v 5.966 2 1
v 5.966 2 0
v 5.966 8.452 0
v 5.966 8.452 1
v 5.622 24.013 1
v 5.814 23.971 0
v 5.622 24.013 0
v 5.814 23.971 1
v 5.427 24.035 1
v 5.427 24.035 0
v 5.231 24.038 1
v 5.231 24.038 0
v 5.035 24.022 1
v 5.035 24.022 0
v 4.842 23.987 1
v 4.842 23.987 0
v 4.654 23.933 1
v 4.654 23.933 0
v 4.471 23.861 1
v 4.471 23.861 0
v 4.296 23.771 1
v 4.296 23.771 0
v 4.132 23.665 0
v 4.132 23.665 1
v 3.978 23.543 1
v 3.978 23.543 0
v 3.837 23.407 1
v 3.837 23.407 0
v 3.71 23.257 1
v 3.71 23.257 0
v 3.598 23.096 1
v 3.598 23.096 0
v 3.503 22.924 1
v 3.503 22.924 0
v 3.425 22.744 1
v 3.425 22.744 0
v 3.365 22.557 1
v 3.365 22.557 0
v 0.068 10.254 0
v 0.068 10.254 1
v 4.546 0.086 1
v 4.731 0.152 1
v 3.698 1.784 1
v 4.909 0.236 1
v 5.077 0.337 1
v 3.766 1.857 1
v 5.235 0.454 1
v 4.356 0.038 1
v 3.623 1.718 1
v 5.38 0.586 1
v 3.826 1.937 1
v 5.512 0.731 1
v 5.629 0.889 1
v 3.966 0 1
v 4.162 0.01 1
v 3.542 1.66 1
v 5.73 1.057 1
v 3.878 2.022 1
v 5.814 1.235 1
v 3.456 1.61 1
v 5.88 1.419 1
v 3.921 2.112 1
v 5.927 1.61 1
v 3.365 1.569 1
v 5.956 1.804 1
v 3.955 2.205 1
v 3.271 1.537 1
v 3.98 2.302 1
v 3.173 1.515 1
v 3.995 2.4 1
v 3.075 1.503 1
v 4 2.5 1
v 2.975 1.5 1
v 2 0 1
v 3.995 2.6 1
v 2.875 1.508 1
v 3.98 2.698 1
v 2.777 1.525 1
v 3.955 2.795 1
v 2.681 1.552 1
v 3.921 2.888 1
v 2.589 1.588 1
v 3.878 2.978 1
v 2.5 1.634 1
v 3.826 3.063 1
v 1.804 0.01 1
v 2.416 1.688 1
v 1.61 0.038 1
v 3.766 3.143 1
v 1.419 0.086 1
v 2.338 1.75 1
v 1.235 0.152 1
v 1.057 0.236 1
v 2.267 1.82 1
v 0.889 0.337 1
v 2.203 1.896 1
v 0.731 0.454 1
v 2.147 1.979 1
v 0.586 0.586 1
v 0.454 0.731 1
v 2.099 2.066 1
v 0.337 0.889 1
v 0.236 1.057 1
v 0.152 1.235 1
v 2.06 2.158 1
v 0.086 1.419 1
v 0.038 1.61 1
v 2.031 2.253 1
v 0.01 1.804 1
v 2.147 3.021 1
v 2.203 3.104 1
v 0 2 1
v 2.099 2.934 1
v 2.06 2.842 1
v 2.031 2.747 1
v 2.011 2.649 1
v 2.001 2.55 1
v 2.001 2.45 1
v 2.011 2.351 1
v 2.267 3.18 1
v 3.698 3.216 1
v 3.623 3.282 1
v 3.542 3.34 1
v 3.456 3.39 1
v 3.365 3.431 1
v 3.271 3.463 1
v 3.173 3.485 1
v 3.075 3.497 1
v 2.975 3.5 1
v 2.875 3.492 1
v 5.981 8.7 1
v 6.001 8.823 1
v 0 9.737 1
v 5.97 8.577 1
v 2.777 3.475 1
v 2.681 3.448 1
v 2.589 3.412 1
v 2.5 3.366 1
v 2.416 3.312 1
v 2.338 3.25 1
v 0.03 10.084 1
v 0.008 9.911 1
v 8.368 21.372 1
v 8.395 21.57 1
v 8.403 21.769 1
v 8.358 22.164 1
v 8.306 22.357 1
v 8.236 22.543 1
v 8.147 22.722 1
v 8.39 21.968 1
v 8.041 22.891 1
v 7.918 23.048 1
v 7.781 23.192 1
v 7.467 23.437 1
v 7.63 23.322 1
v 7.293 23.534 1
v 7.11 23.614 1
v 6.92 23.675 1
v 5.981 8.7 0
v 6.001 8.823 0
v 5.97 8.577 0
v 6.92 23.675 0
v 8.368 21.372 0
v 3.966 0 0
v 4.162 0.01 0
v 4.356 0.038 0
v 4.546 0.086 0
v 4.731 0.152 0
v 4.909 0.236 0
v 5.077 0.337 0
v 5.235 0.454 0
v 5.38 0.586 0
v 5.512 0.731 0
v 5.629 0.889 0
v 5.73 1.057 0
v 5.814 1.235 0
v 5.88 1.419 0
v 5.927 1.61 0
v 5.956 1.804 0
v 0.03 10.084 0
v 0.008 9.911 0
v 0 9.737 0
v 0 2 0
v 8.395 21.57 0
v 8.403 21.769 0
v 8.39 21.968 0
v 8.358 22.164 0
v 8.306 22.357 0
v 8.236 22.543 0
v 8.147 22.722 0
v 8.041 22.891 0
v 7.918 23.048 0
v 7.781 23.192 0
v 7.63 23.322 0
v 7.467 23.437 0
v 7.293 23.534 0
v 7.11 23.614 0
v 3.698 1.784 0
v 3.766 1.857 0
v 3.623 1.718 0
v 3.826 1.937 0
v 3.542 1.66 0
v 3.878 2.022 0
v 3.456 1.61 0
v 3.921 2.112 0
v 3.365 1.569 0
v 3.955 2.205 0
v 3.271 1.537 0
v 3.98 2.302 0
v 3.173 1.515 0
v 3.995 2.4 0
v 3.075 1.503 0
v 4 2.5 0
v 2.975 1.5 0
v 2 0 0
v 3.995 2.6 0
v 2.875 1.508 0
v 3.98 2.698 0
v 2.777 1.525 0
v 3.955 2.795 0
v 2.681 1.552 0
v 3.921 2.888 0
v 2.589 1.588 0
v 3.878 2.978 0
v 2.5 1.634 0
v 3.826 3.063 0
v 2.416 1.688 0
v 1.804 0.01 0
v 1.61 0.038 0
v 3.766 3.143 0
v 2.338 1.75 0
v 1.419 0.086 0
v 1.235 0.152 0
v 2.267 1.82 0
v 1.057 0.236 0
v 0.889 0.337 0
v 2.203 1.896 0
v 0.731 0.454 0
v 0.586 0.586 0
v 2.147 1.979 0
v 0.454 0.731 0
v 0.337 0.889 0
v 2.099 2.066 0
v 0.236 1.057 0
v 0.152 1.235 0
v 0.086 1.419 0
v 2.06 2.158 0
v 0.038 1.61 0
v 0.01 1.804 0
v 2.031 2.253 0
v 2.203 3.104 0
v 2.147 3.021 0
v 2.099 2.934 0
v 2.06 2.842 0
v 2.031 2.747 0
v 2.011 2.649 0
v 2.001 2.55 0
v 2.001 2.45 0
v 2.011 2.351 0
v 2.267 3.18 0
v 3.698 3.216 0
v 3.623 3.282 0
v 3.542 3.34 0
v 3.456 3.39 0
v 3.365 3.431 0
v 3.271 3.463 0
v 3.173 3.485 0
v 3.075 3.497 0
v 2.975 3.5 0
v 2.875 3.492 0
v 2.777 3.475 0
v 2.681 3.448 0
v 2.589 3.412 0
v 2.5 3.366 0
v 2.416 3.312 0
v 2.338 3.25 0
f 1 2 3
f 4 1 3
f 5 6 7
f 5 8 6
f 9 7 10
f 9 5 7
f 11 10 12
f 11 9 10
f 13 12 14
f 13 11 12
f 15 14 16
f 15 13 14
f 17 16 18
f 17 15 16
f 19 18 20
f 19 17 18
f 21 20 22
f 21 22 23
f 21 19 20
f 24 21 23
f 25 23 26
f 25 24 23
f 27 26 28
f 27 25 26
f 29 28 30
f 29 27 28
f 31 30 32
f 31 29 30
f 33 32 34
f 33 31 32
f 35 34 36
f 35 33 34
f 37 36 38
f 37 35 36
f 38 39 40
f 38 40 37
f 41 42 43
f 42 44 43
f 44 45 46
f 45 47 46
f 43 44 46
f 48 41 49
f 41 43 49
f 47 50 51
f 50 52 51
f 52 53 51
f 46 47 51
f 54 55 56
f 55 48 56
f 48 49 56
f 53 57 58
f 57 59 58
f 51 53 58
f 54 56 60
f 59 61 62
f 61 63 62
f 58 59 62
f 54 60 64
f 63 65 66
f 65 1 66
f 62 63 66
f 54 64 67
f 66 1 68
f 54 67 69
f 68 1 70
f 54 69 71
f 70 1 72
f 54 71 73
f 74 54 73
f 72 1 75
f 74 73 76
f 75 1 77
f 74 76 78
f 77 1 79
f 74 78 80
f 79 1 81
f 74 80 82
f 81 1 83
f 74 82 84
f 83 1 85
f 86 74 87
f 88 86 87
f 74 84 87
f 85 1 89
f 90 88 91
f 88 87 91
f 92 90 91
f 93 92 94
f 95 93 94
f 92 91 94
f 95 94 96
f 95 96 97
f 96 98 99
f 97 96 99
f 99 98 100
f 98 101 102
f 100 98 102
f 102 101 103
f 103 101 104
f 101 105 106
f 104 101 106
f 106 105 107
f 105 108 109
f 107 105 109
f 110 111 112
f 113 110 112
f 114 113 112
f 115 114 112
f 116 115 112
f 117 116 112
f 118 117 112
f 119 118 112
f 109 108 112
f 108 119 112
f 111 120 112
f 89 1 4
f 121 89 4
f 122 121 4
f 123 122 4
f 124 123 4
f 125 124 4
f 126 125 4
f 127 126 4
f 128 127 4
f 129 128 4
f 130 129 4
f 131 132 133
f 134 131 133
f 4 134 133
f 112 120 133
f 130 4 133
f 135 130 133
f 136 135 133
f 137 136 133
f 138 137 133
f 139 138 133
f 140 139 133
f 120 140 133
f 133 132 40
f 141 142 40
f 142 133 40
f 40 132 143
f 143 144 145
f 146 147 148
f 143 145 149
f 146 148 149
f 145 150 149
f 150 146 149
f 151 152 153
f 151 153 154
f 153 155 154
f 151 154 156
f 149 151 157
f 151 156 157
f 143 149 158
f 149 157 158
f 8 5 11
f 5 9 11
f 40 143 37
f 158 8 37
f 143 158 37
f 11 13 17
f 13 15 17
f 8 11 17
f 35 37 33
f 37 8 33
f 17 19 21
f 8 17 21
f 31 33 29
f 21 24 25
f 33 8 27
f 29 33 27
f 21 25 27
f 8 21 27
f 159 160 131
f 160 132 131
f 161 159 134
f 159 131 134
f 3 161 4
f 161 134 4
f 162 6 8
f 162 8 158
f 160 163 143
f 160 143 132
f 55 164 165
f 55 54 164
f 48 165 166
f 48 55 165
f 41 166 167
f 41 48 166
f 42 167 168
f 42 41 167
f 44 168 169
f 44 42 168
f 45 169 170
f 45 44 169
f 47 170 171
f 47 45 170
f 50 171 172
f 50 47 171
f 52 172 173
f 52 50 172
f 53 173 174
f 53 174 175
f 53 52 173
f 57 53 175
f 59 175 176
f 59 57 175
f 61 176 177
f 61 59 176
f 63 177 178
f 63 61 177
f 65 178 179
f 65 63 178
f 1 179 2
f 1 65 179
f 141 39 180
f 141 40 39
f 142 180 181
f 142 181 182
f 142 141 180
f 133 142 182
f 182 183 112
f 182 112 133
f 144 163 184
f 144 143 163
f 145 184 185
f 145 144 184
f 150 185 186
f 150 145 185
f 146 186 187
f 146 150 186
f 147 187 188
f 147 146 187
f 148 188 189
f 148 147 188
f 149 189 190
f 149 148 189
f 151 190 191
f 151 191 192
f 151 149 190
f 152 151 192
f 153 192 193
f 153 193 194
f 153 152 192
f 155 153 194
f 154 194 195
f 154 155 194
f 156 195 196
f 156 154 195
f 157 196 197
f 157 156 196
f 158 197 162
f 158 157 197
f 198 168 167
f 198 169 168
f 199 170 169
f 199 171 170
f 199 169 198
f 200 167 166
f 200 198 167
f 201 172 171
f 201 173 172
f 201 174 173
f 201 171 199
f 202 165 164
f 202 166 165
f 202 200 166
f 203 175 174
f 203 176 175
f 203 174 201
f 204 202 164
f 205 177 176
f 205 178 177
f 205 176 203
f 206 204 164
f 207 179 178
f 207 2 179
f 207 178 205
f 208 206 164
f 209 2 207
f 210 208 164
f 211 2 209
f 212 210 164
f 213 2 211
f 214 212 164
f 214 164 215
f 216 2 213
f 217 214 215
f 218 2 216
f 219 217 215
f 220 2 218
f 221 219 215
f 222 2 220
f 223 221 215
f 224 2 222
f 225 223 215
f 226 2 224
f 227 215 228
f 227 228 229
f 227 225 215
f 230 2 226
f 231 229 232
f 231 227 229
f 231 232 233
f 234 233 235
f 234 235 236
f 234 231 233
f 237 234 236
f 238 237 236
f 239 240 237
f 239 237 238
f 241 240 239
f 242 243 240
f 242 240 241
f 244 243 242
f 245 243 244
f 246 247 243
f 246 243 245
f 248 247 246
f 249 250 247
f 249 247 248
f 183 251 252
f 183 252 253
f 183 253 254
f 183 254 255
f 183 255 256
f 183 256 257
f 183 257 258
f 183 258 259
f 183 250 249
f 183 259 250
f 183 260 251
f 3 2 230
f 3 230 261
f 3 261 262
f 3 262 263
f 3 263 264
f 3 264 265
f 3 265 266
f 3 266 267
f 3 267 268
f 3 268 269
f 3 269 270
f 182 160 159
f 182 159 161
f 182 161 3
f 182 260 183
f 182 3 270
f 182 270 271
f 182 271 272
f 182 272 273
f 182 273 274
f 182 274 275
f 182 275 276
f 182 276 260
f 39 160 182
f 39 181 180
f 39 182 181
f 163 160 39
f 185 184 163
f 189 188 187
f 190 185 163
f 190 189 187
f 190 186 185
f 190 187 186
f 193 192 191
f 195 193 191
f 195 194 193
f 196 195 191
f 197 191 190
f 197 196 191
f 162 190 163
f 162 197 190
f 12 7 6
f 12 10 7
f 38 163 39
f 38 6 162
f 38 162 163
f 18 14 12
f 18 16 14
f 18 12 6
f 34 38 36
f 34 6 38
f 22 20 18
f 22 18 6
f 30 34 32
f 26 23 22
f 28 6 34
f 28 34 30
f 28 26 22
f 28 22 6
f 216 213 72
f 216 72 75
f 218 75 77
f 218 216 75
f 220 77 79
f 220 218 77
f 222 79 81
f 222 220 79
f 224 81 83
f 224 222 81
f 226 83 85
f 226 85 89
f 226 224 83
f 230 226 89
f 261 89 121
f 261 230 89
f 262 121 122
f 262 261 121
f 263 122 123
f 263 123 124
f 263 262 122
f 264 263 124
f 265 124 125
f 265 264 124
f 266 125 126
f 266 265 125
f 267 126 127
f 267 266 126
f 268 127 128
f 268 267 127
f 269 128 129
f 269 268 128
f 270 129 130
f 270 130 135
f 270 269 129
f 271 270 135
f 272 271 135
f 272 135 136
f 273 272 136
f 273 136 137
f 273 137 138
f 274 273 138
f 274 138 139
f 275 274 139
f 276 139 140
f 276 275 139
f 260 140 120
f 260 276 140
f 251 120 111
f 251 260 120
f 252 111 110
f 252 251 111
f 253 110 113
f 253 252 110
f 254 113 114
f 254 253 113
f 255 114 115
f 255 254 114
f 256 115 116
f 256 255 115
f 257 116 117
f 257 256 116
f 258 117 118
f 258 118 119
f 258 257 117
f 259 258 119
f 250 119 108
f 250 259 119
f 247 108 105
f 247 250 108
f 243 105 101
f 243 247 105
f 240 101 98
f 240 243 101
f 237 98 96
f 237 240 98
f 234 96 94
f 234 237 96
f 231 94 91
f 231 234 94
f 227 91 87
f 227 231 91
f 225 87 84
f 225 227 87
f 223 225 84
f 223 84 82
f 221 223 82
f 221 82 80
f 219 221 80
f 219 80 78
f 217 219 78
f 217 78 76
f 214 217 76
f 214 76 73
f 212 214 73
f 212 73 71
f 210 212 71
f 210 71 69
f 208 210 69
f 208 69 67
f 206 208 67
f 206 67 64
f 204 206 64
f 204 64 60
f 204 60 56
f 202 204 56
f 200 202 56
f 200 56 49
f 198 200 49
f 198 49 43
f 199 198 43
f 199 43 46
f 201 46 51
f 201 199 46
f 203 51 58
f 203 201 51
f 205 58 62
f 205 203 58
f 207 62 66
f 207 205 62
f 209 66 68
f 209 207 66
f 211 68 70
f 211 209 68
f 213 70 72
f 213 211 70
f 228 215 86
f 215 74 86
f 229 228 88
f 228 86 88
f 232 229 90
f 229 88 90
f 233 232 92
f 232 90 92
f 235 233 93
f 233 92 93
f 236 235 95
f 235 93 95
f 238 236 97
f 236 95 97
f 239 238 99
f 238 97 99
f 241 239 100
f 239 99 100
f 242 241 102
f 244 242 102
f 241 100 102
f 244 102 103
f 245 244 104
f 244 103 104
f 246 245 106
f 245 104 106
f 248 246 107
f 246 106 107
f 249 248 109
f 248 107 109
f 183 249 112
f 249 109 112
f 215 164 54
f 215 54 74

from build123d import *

# Parameters (mm, degrees)
SKETCH1_R           = 1
BOSS_EXTRUDE1_DEPTH = 1
FILLET1_R           = 2
FILLET2_R           = 2
FILLET3_R           = 2
FILLET4_R           = 2
FILLET5_R           = 2
FILLET6_R           = 2


with BuildPart() as part:
    # Sketch1 → Boss-Extrude1 (new body)
    with BuildSketch(Plane.XY):
        Polygon((0, 10), (3.882285677, 24.488887394), (8.711914808, 23.194792169), (5.965925826, 8.639463055), (5.965925826, 8.027846959), (5.965925826, 0), (0, 0), align=None)
        with Locations((2.999793512, 2.5)):
            Circle(SKETCH1_R, mode=Mode.SUBTRACT)
    extrude(amount=BOSS_EXTRUDE1_DEPTH)

    # Fillet1
    fillet1_edges = [part.edges().sort_by_distance(p)[0] for p in [
        (5.965925826, 0, 0.5),
    ]]
    fillet(fillet1_edges, radius=FILLET1_R)

    # Fillet2
    fillet2_edges = [part.edges().sort_by_distance(p)[0] for p in [
        (0, 0, 0.5),
    ]]
    fillet(fillet2_edges, radius=FILLET2_R)

    # Fillet3
    fillet3_edges = [part.edges().sort_by_distance(p)[0] for p in [
        (8.711914808, 23.194792169, 0.5),
    ]]
    fillet(fillet3_edges, radius=FILLET3_R)

    # Fillet4
    fillet4_edges = [part.edges().sort_by_distance(p)[0] for p in [
        (3.882285677, 24.488887394, 0.5),
    ]]
    fillet(fillet4_edges, radius=FILLET4_R)

    # Fillet5
    fillet5_edges = [part.edges().sort_by_distance(p)[0] for p in [
        (0, 10, 0.5),
    ]]
    fillet(fillet5_edges, radius=FILLET5_R)

    # Fillet6
    fillet6_edges = [part.edges().sort_by_distance(p)[0] for p in [
        (5.965925826, 8.639463055, 0.5),
    ]]
    fillet(fillet6_edges, radius=FILLET6_R)


solid = part.part
